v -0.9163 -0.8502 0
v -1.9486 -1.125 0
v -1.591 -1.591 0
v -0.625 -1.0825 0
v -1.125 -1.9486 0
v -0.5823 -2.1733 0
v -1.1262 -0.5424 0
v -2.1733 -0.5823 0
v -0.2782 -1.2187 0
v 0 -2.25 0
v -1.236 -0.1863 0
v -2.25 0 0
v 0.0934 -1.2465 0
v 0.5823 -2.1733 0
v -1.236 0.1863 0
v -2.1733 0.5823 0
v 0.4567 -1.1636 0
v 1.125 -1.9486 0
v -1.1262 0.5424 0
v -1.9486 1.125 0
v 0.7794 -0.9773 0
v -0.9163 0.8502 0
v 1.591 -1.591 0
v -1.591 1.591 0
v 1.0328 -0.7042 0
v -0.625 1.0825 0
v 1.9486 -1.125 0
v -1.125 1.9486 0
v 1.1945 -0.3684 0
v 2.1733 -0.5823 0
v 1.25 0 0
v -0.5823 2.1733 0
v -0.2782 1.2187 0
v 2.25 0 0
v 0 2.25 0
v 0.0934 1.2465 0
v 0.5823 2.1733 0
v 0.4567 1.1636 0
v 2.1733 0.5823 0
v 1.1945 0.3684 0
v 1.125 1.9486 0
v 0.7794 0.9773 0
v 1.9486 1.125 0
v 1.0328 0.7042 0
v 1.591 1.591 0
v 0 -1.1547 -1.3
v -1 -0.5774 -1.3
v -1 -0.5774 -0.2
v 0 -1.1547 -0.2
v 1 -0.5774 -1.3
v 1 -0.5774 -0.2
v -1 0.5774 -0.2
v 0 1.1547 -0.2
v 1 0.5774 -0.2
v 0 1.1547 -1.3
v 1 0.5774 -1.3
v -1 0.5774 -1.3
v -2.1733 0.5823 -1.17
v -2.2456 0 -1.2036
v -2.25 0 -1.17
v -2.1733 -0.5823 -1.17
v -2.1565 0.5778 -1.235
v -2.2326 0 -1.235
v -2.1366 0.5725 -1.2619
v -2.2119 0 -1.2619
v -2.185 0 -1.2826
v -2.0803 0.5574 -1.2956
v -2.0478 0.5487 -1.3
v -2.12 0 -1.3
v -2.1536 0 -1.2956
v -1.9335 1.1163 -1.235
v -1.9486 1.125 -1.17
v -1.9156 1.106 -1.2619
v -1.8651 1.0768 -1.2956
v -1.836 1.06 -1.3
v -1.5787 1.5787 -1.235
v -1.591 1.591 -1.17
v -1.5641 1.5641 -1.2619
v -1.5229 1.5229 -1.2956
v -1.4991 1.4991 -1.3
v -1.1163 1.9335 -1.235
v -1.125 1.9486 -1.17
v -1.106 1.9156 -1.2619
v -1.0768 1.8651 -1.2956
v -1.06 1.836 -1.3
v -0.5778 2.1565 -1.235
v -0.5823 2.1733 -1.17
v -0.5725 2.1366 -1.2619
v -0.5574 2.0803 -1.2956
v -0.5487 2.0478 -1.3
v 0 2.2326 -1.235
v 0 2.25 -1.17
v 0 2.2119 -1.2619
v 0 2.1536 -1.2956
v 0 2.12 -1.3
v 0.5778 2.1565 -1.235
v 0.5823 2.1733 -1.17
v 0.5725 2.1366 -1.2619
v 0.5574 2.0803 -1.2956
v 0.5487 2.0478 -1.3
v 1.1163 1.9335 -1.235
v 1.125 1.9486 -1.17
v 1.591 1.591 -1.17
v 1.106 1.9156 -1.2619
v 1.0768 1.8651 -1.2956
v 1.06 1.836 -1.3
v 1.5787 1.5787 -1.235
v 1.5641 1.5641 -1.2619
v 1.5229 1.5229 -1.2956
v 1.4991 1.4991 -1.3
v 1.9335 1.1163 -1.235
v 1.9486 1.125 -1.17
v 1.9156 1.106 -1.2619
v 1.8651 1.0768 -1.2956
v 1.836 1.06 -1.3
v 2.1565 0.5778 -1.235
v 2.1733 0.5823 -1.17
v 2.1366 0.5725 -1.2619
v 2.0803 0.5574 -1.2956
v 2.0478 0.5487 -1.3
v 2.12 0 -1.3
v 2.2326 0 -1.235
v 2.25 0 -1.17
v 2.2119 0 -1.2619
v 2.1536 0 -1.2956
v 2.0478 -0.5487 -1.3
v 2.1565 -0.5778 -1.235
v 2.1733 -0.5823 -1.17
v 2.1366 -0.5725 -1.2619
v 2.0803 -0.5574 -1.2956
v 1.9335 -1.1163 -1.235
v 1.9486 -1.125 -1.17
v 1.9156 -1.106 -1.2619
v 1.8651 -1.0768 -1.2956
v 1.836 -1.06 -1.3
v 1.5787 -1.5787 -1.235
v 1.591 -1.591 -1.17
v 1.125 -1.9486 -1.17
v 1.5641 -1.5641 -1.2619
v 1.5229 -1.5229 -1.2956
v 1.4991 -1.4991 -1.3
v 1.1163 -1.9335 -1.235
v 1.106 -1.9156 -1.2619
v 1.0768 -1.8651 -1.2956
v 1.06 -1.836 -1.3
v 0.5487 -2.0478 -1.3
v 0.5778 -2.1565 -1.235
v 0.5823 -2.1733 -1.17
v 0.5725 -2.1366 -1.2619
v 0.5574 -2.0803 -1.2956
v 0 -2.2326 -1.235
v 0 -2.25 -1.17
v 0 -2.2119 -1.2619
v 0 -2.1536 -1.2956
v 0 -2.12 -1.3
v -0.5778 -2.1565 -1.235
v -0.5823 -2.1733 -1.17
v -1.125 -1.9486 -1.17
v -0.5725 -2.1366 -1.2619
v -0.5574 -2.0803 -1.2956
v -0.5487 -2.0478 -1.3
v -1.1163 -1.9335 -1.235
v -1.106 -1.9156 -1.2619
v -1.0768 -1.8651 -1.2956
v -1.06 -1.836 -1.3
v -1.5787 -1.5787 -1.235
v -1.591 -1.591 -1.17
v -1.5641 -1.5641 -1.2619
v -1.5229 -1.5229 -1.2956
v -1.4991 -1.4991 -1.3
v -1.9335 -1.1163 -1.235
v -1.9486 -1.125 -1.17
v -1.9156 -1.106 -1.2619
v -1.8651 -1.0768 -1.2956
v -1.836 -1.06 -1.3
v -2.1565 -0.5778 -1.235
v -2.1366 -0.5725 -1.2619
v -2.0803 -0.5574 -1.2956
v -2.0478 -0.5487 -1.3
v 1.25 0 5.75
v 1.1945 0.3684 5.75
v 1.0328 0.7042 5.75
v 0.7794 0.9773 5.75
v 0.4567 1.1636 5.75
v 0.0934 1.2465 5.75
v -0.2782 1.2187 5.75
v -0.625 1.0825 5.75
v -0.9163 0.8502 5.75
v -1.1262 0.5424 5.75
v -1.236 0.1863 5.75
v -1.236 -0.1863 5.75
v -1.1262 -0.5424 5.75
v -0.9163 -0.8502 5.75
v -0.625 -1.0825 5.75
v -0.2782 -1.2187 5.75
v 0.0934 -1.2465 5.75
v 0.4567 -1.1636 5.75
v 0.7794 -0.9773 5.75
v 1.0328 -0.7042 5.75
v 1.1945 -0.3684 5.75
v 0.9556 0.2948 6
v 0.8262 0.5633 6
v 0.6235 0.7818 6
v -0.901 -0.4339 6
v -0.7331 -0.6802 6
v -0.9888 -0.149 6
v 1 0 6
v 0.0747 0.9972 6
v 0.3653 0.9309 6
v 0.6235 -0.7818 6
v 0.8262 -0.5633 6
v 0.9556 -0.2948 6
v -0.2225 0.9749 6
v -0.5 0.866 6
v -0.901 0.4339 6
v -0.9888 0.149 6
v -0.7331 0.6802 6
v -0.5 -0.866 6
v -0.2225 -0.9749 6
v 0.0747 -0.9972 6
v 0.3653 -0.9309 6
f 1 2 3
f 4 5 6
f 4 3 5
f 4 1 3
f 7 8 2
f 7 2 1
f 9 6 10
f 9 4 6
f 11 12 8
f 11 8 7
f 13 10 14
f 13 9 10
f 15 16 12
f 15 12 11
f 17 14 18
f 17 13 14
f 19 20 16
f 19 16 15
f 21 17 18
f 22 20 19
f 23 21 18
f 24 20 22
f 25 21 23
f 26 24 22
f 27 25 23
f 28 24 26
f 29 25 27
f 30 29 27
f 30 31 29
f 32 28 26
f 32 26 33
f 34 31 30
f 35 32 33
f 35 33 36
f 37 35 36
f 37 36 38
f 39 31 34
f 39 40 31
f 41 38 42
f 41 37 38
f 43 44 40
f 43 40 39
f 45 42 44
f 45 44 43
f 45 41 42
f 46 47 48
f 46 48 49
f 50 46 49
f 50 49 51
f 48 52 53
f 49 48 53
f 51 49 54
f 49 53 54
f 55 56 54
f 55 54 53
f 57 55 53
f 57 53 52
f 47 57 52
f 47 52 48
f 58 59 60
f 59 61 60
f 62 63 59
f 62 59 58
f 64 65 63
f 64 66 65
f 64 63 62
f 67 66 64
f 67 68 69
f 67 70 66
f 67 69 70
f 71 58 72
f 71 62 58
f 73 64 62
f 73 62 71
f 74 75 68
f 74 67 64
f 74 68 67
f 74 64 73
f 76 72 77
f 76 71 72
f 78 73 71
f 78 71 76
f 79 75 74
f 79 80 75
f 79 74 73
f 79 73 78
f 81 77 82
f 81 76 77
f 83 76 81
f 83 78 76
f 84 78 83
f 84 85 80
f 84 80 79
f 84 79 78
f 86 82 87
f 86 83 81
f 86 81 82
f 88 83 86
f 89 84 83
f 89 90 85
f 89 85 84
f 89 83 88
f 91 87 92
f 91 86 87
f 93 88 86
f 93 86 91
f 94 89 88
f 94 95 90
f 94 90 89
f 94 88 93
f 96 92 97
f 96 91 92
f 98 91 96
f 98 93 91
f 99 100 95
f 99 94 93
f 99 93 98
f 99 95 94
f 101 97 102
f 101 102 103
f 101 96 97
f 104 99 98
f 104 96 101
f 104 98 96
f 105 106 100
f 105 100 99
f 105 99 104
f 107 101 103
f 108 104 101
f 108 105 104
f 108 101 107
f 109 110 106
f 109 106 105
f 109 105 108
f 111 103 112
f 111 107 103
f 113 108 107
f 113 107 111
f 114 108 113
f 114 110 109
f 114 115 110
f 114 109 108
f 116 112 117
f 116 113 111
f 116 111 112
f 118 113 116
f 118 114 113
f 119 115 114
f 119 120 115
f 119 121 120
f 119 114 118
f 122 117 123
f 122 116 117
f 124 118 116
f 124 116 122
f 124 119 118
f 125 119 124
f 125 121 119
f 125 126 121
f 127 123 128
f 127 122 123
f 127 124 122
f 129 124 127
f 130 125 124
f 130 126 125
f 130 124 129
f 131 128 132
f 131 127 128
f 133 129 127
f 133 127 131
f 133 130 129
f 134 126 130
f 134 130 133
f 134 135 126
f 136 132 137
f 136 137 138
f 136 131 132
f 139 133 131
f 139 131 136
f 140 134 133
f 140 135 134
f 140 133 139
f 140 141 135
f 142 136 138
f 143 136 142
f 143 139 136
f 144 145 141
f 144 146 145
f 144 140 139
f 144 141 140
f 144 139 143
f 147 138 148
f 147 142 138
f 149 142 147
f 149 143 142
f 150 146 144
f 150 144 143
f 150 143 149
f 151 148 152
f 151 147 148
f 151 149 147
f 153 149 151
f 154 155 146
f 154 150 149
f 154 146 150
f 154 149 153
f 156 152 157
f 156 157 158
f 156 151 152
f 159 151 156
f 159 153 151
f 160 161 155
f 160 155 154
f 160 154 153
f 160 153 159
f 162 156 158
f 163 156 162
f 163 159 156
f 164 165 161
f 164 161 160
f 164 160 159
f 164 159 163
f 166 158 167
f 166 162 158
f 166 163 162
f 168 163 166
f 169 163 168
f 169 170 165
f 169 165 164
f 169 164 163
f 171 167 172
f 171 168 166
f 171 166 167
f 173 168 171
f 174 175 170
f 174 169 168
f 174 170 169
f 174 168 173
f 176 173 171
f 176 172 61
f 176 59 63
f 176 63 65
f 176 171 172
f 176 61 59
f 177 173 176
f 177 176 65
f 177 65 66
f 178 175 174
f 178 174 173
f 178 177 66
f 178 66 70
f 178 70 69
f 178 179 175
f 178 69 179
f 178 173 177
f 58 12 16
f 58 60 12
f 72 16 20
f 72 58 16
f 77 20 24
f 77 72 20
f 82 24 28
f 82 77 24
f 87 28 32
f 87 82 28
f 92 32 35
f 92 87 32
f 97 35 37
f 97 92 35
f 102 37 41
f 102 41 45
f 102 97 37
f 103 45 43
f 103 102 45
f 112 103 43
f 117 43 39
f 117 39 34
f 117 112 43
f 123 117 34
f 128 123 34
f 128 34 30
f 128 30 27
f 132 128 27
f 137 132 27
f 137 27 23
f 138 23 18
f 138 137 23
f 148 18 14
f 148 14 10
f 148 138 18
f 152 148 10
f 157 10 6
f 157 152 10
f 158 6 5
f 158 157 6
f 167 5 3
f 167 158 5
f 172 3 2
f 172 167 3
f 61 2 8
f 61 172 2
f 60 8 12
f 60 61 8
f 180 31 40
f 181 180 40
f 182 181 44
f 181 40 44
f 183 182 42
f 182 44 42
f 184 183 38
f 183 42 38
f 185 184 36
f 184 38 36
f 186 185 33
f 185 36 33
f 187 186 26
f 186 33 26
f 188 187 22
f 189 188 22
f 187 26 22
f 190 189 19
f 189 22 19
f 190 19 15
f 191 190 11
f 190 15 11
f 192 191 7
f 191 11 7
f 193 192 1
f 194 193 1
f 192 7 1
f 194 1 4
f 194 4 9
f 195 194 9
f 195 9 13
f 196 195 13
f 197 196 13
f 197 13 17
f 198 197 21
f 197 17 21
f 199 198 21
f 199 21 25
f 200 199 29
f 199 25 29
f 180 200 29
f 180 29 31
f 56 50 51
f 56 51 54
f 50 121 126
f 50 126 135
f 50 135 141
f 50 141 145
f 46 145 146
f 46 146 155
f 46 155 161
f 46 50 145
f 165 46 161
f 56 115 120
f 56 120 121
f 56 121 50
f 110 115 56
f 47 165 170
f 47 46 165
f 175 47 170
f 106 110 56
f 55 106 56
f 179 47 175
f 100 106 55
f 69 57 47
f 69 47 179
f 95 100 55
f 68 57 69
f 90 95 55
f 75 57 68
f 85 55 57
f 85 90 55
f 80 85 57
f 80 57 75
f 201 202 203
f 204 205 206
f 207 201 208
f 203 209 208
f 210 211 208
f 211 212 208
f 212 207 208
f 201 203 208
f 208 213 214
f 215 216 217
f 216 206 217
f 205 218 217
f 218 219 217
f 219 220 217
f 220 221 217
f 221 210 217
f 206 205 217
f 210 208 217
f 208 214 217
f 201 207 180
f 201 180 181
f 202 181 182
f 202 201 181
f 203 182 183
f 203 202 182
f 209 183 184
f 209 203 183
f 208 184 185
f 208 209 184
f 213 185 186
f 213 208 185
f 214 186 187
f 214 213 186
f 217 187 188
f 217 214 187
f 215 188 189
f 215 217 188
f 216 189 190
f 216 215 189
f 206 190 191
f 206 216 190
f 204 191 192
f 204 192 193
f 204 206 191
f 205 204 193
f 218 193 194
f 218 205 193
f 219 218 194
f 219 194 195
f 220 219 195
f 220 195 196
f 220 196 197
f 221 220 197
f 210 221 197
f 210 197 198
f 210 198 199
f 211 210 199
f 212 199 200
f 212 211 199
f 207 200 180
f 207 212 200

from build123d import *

# Parameters (mm, degrees)
ENLEV_MAT_EXTRU1_DEPTH = 1.1
ESQUISSE3_W            = 1.25
ESQUISSE3_H            = 6
CHANFREIN1_SIZE        = 0.25


with BuildPart() as part:
    # Esquisse1 → Base-Révolution (revolve)
    with BuildSketch(Plane(origin=(0, 0, 0), x_dir=(1, 0, 0), z_dir=(0, 1, 0)), mode=Mode.PRIVATE) as base_r_volution_sk:
        with BuildLine():
            Line((0, 0), (2.25, 0))
            Line((2.25, 0), (2.25, 1.17))
            ThreePointArc((2.25, 1.17), (2.211923882, 1.261923882), (2.12, 1.3))
            Line((2.12, 1.3), (0, 1.3))
            Line((0, 1.3), (0, 0))
        make_face()
    revolve(base_r_volution_sk.sketch.rotate(Axis((0, 0, 0), (0, 0, -1)), 180), axis=Axis((0, 0, 0), (0, 0, -1)))

    # Esquisse2 → enlev-mat-Extru1 (cut)
    with BuildSketch(Plane.XY.offset(-1.3)):
        Polygon((1, -0.577350269), (1, 0.577350269), (0, 1.154700538), (-1, 0.577350269), (-1, -0.577350269), (0, -1.154700538), align=None)
    extrude(amount=ENLEV_MAT_EXTRU1_DEPTH, mode=Mode.SUBTRACT)

    # Esquisse3 → Boss.-Révol.1 (revolve)
    with BuildSketch(Plane(origin=(0, 0, 0), x_dir=(1, 0, 0), z_dir=(0, 1, 0))):
        with Locations((0.625, -3)):
            Rectangle(ESQUISSE3_W, ESQUISSE3_H)
    revolve(axis=Axis((0, 0, 0), (0, 0, 1)))

    # Chanfrein1
    chanfrein1_edges = [part.edges().sort_by_distance(p)[0] for p in [
        (-1.25, 0, 6),
    ]]
    chamfer(chanfrein1_edges, length=CHANFREIN1_SIZE)


solid = part.part
